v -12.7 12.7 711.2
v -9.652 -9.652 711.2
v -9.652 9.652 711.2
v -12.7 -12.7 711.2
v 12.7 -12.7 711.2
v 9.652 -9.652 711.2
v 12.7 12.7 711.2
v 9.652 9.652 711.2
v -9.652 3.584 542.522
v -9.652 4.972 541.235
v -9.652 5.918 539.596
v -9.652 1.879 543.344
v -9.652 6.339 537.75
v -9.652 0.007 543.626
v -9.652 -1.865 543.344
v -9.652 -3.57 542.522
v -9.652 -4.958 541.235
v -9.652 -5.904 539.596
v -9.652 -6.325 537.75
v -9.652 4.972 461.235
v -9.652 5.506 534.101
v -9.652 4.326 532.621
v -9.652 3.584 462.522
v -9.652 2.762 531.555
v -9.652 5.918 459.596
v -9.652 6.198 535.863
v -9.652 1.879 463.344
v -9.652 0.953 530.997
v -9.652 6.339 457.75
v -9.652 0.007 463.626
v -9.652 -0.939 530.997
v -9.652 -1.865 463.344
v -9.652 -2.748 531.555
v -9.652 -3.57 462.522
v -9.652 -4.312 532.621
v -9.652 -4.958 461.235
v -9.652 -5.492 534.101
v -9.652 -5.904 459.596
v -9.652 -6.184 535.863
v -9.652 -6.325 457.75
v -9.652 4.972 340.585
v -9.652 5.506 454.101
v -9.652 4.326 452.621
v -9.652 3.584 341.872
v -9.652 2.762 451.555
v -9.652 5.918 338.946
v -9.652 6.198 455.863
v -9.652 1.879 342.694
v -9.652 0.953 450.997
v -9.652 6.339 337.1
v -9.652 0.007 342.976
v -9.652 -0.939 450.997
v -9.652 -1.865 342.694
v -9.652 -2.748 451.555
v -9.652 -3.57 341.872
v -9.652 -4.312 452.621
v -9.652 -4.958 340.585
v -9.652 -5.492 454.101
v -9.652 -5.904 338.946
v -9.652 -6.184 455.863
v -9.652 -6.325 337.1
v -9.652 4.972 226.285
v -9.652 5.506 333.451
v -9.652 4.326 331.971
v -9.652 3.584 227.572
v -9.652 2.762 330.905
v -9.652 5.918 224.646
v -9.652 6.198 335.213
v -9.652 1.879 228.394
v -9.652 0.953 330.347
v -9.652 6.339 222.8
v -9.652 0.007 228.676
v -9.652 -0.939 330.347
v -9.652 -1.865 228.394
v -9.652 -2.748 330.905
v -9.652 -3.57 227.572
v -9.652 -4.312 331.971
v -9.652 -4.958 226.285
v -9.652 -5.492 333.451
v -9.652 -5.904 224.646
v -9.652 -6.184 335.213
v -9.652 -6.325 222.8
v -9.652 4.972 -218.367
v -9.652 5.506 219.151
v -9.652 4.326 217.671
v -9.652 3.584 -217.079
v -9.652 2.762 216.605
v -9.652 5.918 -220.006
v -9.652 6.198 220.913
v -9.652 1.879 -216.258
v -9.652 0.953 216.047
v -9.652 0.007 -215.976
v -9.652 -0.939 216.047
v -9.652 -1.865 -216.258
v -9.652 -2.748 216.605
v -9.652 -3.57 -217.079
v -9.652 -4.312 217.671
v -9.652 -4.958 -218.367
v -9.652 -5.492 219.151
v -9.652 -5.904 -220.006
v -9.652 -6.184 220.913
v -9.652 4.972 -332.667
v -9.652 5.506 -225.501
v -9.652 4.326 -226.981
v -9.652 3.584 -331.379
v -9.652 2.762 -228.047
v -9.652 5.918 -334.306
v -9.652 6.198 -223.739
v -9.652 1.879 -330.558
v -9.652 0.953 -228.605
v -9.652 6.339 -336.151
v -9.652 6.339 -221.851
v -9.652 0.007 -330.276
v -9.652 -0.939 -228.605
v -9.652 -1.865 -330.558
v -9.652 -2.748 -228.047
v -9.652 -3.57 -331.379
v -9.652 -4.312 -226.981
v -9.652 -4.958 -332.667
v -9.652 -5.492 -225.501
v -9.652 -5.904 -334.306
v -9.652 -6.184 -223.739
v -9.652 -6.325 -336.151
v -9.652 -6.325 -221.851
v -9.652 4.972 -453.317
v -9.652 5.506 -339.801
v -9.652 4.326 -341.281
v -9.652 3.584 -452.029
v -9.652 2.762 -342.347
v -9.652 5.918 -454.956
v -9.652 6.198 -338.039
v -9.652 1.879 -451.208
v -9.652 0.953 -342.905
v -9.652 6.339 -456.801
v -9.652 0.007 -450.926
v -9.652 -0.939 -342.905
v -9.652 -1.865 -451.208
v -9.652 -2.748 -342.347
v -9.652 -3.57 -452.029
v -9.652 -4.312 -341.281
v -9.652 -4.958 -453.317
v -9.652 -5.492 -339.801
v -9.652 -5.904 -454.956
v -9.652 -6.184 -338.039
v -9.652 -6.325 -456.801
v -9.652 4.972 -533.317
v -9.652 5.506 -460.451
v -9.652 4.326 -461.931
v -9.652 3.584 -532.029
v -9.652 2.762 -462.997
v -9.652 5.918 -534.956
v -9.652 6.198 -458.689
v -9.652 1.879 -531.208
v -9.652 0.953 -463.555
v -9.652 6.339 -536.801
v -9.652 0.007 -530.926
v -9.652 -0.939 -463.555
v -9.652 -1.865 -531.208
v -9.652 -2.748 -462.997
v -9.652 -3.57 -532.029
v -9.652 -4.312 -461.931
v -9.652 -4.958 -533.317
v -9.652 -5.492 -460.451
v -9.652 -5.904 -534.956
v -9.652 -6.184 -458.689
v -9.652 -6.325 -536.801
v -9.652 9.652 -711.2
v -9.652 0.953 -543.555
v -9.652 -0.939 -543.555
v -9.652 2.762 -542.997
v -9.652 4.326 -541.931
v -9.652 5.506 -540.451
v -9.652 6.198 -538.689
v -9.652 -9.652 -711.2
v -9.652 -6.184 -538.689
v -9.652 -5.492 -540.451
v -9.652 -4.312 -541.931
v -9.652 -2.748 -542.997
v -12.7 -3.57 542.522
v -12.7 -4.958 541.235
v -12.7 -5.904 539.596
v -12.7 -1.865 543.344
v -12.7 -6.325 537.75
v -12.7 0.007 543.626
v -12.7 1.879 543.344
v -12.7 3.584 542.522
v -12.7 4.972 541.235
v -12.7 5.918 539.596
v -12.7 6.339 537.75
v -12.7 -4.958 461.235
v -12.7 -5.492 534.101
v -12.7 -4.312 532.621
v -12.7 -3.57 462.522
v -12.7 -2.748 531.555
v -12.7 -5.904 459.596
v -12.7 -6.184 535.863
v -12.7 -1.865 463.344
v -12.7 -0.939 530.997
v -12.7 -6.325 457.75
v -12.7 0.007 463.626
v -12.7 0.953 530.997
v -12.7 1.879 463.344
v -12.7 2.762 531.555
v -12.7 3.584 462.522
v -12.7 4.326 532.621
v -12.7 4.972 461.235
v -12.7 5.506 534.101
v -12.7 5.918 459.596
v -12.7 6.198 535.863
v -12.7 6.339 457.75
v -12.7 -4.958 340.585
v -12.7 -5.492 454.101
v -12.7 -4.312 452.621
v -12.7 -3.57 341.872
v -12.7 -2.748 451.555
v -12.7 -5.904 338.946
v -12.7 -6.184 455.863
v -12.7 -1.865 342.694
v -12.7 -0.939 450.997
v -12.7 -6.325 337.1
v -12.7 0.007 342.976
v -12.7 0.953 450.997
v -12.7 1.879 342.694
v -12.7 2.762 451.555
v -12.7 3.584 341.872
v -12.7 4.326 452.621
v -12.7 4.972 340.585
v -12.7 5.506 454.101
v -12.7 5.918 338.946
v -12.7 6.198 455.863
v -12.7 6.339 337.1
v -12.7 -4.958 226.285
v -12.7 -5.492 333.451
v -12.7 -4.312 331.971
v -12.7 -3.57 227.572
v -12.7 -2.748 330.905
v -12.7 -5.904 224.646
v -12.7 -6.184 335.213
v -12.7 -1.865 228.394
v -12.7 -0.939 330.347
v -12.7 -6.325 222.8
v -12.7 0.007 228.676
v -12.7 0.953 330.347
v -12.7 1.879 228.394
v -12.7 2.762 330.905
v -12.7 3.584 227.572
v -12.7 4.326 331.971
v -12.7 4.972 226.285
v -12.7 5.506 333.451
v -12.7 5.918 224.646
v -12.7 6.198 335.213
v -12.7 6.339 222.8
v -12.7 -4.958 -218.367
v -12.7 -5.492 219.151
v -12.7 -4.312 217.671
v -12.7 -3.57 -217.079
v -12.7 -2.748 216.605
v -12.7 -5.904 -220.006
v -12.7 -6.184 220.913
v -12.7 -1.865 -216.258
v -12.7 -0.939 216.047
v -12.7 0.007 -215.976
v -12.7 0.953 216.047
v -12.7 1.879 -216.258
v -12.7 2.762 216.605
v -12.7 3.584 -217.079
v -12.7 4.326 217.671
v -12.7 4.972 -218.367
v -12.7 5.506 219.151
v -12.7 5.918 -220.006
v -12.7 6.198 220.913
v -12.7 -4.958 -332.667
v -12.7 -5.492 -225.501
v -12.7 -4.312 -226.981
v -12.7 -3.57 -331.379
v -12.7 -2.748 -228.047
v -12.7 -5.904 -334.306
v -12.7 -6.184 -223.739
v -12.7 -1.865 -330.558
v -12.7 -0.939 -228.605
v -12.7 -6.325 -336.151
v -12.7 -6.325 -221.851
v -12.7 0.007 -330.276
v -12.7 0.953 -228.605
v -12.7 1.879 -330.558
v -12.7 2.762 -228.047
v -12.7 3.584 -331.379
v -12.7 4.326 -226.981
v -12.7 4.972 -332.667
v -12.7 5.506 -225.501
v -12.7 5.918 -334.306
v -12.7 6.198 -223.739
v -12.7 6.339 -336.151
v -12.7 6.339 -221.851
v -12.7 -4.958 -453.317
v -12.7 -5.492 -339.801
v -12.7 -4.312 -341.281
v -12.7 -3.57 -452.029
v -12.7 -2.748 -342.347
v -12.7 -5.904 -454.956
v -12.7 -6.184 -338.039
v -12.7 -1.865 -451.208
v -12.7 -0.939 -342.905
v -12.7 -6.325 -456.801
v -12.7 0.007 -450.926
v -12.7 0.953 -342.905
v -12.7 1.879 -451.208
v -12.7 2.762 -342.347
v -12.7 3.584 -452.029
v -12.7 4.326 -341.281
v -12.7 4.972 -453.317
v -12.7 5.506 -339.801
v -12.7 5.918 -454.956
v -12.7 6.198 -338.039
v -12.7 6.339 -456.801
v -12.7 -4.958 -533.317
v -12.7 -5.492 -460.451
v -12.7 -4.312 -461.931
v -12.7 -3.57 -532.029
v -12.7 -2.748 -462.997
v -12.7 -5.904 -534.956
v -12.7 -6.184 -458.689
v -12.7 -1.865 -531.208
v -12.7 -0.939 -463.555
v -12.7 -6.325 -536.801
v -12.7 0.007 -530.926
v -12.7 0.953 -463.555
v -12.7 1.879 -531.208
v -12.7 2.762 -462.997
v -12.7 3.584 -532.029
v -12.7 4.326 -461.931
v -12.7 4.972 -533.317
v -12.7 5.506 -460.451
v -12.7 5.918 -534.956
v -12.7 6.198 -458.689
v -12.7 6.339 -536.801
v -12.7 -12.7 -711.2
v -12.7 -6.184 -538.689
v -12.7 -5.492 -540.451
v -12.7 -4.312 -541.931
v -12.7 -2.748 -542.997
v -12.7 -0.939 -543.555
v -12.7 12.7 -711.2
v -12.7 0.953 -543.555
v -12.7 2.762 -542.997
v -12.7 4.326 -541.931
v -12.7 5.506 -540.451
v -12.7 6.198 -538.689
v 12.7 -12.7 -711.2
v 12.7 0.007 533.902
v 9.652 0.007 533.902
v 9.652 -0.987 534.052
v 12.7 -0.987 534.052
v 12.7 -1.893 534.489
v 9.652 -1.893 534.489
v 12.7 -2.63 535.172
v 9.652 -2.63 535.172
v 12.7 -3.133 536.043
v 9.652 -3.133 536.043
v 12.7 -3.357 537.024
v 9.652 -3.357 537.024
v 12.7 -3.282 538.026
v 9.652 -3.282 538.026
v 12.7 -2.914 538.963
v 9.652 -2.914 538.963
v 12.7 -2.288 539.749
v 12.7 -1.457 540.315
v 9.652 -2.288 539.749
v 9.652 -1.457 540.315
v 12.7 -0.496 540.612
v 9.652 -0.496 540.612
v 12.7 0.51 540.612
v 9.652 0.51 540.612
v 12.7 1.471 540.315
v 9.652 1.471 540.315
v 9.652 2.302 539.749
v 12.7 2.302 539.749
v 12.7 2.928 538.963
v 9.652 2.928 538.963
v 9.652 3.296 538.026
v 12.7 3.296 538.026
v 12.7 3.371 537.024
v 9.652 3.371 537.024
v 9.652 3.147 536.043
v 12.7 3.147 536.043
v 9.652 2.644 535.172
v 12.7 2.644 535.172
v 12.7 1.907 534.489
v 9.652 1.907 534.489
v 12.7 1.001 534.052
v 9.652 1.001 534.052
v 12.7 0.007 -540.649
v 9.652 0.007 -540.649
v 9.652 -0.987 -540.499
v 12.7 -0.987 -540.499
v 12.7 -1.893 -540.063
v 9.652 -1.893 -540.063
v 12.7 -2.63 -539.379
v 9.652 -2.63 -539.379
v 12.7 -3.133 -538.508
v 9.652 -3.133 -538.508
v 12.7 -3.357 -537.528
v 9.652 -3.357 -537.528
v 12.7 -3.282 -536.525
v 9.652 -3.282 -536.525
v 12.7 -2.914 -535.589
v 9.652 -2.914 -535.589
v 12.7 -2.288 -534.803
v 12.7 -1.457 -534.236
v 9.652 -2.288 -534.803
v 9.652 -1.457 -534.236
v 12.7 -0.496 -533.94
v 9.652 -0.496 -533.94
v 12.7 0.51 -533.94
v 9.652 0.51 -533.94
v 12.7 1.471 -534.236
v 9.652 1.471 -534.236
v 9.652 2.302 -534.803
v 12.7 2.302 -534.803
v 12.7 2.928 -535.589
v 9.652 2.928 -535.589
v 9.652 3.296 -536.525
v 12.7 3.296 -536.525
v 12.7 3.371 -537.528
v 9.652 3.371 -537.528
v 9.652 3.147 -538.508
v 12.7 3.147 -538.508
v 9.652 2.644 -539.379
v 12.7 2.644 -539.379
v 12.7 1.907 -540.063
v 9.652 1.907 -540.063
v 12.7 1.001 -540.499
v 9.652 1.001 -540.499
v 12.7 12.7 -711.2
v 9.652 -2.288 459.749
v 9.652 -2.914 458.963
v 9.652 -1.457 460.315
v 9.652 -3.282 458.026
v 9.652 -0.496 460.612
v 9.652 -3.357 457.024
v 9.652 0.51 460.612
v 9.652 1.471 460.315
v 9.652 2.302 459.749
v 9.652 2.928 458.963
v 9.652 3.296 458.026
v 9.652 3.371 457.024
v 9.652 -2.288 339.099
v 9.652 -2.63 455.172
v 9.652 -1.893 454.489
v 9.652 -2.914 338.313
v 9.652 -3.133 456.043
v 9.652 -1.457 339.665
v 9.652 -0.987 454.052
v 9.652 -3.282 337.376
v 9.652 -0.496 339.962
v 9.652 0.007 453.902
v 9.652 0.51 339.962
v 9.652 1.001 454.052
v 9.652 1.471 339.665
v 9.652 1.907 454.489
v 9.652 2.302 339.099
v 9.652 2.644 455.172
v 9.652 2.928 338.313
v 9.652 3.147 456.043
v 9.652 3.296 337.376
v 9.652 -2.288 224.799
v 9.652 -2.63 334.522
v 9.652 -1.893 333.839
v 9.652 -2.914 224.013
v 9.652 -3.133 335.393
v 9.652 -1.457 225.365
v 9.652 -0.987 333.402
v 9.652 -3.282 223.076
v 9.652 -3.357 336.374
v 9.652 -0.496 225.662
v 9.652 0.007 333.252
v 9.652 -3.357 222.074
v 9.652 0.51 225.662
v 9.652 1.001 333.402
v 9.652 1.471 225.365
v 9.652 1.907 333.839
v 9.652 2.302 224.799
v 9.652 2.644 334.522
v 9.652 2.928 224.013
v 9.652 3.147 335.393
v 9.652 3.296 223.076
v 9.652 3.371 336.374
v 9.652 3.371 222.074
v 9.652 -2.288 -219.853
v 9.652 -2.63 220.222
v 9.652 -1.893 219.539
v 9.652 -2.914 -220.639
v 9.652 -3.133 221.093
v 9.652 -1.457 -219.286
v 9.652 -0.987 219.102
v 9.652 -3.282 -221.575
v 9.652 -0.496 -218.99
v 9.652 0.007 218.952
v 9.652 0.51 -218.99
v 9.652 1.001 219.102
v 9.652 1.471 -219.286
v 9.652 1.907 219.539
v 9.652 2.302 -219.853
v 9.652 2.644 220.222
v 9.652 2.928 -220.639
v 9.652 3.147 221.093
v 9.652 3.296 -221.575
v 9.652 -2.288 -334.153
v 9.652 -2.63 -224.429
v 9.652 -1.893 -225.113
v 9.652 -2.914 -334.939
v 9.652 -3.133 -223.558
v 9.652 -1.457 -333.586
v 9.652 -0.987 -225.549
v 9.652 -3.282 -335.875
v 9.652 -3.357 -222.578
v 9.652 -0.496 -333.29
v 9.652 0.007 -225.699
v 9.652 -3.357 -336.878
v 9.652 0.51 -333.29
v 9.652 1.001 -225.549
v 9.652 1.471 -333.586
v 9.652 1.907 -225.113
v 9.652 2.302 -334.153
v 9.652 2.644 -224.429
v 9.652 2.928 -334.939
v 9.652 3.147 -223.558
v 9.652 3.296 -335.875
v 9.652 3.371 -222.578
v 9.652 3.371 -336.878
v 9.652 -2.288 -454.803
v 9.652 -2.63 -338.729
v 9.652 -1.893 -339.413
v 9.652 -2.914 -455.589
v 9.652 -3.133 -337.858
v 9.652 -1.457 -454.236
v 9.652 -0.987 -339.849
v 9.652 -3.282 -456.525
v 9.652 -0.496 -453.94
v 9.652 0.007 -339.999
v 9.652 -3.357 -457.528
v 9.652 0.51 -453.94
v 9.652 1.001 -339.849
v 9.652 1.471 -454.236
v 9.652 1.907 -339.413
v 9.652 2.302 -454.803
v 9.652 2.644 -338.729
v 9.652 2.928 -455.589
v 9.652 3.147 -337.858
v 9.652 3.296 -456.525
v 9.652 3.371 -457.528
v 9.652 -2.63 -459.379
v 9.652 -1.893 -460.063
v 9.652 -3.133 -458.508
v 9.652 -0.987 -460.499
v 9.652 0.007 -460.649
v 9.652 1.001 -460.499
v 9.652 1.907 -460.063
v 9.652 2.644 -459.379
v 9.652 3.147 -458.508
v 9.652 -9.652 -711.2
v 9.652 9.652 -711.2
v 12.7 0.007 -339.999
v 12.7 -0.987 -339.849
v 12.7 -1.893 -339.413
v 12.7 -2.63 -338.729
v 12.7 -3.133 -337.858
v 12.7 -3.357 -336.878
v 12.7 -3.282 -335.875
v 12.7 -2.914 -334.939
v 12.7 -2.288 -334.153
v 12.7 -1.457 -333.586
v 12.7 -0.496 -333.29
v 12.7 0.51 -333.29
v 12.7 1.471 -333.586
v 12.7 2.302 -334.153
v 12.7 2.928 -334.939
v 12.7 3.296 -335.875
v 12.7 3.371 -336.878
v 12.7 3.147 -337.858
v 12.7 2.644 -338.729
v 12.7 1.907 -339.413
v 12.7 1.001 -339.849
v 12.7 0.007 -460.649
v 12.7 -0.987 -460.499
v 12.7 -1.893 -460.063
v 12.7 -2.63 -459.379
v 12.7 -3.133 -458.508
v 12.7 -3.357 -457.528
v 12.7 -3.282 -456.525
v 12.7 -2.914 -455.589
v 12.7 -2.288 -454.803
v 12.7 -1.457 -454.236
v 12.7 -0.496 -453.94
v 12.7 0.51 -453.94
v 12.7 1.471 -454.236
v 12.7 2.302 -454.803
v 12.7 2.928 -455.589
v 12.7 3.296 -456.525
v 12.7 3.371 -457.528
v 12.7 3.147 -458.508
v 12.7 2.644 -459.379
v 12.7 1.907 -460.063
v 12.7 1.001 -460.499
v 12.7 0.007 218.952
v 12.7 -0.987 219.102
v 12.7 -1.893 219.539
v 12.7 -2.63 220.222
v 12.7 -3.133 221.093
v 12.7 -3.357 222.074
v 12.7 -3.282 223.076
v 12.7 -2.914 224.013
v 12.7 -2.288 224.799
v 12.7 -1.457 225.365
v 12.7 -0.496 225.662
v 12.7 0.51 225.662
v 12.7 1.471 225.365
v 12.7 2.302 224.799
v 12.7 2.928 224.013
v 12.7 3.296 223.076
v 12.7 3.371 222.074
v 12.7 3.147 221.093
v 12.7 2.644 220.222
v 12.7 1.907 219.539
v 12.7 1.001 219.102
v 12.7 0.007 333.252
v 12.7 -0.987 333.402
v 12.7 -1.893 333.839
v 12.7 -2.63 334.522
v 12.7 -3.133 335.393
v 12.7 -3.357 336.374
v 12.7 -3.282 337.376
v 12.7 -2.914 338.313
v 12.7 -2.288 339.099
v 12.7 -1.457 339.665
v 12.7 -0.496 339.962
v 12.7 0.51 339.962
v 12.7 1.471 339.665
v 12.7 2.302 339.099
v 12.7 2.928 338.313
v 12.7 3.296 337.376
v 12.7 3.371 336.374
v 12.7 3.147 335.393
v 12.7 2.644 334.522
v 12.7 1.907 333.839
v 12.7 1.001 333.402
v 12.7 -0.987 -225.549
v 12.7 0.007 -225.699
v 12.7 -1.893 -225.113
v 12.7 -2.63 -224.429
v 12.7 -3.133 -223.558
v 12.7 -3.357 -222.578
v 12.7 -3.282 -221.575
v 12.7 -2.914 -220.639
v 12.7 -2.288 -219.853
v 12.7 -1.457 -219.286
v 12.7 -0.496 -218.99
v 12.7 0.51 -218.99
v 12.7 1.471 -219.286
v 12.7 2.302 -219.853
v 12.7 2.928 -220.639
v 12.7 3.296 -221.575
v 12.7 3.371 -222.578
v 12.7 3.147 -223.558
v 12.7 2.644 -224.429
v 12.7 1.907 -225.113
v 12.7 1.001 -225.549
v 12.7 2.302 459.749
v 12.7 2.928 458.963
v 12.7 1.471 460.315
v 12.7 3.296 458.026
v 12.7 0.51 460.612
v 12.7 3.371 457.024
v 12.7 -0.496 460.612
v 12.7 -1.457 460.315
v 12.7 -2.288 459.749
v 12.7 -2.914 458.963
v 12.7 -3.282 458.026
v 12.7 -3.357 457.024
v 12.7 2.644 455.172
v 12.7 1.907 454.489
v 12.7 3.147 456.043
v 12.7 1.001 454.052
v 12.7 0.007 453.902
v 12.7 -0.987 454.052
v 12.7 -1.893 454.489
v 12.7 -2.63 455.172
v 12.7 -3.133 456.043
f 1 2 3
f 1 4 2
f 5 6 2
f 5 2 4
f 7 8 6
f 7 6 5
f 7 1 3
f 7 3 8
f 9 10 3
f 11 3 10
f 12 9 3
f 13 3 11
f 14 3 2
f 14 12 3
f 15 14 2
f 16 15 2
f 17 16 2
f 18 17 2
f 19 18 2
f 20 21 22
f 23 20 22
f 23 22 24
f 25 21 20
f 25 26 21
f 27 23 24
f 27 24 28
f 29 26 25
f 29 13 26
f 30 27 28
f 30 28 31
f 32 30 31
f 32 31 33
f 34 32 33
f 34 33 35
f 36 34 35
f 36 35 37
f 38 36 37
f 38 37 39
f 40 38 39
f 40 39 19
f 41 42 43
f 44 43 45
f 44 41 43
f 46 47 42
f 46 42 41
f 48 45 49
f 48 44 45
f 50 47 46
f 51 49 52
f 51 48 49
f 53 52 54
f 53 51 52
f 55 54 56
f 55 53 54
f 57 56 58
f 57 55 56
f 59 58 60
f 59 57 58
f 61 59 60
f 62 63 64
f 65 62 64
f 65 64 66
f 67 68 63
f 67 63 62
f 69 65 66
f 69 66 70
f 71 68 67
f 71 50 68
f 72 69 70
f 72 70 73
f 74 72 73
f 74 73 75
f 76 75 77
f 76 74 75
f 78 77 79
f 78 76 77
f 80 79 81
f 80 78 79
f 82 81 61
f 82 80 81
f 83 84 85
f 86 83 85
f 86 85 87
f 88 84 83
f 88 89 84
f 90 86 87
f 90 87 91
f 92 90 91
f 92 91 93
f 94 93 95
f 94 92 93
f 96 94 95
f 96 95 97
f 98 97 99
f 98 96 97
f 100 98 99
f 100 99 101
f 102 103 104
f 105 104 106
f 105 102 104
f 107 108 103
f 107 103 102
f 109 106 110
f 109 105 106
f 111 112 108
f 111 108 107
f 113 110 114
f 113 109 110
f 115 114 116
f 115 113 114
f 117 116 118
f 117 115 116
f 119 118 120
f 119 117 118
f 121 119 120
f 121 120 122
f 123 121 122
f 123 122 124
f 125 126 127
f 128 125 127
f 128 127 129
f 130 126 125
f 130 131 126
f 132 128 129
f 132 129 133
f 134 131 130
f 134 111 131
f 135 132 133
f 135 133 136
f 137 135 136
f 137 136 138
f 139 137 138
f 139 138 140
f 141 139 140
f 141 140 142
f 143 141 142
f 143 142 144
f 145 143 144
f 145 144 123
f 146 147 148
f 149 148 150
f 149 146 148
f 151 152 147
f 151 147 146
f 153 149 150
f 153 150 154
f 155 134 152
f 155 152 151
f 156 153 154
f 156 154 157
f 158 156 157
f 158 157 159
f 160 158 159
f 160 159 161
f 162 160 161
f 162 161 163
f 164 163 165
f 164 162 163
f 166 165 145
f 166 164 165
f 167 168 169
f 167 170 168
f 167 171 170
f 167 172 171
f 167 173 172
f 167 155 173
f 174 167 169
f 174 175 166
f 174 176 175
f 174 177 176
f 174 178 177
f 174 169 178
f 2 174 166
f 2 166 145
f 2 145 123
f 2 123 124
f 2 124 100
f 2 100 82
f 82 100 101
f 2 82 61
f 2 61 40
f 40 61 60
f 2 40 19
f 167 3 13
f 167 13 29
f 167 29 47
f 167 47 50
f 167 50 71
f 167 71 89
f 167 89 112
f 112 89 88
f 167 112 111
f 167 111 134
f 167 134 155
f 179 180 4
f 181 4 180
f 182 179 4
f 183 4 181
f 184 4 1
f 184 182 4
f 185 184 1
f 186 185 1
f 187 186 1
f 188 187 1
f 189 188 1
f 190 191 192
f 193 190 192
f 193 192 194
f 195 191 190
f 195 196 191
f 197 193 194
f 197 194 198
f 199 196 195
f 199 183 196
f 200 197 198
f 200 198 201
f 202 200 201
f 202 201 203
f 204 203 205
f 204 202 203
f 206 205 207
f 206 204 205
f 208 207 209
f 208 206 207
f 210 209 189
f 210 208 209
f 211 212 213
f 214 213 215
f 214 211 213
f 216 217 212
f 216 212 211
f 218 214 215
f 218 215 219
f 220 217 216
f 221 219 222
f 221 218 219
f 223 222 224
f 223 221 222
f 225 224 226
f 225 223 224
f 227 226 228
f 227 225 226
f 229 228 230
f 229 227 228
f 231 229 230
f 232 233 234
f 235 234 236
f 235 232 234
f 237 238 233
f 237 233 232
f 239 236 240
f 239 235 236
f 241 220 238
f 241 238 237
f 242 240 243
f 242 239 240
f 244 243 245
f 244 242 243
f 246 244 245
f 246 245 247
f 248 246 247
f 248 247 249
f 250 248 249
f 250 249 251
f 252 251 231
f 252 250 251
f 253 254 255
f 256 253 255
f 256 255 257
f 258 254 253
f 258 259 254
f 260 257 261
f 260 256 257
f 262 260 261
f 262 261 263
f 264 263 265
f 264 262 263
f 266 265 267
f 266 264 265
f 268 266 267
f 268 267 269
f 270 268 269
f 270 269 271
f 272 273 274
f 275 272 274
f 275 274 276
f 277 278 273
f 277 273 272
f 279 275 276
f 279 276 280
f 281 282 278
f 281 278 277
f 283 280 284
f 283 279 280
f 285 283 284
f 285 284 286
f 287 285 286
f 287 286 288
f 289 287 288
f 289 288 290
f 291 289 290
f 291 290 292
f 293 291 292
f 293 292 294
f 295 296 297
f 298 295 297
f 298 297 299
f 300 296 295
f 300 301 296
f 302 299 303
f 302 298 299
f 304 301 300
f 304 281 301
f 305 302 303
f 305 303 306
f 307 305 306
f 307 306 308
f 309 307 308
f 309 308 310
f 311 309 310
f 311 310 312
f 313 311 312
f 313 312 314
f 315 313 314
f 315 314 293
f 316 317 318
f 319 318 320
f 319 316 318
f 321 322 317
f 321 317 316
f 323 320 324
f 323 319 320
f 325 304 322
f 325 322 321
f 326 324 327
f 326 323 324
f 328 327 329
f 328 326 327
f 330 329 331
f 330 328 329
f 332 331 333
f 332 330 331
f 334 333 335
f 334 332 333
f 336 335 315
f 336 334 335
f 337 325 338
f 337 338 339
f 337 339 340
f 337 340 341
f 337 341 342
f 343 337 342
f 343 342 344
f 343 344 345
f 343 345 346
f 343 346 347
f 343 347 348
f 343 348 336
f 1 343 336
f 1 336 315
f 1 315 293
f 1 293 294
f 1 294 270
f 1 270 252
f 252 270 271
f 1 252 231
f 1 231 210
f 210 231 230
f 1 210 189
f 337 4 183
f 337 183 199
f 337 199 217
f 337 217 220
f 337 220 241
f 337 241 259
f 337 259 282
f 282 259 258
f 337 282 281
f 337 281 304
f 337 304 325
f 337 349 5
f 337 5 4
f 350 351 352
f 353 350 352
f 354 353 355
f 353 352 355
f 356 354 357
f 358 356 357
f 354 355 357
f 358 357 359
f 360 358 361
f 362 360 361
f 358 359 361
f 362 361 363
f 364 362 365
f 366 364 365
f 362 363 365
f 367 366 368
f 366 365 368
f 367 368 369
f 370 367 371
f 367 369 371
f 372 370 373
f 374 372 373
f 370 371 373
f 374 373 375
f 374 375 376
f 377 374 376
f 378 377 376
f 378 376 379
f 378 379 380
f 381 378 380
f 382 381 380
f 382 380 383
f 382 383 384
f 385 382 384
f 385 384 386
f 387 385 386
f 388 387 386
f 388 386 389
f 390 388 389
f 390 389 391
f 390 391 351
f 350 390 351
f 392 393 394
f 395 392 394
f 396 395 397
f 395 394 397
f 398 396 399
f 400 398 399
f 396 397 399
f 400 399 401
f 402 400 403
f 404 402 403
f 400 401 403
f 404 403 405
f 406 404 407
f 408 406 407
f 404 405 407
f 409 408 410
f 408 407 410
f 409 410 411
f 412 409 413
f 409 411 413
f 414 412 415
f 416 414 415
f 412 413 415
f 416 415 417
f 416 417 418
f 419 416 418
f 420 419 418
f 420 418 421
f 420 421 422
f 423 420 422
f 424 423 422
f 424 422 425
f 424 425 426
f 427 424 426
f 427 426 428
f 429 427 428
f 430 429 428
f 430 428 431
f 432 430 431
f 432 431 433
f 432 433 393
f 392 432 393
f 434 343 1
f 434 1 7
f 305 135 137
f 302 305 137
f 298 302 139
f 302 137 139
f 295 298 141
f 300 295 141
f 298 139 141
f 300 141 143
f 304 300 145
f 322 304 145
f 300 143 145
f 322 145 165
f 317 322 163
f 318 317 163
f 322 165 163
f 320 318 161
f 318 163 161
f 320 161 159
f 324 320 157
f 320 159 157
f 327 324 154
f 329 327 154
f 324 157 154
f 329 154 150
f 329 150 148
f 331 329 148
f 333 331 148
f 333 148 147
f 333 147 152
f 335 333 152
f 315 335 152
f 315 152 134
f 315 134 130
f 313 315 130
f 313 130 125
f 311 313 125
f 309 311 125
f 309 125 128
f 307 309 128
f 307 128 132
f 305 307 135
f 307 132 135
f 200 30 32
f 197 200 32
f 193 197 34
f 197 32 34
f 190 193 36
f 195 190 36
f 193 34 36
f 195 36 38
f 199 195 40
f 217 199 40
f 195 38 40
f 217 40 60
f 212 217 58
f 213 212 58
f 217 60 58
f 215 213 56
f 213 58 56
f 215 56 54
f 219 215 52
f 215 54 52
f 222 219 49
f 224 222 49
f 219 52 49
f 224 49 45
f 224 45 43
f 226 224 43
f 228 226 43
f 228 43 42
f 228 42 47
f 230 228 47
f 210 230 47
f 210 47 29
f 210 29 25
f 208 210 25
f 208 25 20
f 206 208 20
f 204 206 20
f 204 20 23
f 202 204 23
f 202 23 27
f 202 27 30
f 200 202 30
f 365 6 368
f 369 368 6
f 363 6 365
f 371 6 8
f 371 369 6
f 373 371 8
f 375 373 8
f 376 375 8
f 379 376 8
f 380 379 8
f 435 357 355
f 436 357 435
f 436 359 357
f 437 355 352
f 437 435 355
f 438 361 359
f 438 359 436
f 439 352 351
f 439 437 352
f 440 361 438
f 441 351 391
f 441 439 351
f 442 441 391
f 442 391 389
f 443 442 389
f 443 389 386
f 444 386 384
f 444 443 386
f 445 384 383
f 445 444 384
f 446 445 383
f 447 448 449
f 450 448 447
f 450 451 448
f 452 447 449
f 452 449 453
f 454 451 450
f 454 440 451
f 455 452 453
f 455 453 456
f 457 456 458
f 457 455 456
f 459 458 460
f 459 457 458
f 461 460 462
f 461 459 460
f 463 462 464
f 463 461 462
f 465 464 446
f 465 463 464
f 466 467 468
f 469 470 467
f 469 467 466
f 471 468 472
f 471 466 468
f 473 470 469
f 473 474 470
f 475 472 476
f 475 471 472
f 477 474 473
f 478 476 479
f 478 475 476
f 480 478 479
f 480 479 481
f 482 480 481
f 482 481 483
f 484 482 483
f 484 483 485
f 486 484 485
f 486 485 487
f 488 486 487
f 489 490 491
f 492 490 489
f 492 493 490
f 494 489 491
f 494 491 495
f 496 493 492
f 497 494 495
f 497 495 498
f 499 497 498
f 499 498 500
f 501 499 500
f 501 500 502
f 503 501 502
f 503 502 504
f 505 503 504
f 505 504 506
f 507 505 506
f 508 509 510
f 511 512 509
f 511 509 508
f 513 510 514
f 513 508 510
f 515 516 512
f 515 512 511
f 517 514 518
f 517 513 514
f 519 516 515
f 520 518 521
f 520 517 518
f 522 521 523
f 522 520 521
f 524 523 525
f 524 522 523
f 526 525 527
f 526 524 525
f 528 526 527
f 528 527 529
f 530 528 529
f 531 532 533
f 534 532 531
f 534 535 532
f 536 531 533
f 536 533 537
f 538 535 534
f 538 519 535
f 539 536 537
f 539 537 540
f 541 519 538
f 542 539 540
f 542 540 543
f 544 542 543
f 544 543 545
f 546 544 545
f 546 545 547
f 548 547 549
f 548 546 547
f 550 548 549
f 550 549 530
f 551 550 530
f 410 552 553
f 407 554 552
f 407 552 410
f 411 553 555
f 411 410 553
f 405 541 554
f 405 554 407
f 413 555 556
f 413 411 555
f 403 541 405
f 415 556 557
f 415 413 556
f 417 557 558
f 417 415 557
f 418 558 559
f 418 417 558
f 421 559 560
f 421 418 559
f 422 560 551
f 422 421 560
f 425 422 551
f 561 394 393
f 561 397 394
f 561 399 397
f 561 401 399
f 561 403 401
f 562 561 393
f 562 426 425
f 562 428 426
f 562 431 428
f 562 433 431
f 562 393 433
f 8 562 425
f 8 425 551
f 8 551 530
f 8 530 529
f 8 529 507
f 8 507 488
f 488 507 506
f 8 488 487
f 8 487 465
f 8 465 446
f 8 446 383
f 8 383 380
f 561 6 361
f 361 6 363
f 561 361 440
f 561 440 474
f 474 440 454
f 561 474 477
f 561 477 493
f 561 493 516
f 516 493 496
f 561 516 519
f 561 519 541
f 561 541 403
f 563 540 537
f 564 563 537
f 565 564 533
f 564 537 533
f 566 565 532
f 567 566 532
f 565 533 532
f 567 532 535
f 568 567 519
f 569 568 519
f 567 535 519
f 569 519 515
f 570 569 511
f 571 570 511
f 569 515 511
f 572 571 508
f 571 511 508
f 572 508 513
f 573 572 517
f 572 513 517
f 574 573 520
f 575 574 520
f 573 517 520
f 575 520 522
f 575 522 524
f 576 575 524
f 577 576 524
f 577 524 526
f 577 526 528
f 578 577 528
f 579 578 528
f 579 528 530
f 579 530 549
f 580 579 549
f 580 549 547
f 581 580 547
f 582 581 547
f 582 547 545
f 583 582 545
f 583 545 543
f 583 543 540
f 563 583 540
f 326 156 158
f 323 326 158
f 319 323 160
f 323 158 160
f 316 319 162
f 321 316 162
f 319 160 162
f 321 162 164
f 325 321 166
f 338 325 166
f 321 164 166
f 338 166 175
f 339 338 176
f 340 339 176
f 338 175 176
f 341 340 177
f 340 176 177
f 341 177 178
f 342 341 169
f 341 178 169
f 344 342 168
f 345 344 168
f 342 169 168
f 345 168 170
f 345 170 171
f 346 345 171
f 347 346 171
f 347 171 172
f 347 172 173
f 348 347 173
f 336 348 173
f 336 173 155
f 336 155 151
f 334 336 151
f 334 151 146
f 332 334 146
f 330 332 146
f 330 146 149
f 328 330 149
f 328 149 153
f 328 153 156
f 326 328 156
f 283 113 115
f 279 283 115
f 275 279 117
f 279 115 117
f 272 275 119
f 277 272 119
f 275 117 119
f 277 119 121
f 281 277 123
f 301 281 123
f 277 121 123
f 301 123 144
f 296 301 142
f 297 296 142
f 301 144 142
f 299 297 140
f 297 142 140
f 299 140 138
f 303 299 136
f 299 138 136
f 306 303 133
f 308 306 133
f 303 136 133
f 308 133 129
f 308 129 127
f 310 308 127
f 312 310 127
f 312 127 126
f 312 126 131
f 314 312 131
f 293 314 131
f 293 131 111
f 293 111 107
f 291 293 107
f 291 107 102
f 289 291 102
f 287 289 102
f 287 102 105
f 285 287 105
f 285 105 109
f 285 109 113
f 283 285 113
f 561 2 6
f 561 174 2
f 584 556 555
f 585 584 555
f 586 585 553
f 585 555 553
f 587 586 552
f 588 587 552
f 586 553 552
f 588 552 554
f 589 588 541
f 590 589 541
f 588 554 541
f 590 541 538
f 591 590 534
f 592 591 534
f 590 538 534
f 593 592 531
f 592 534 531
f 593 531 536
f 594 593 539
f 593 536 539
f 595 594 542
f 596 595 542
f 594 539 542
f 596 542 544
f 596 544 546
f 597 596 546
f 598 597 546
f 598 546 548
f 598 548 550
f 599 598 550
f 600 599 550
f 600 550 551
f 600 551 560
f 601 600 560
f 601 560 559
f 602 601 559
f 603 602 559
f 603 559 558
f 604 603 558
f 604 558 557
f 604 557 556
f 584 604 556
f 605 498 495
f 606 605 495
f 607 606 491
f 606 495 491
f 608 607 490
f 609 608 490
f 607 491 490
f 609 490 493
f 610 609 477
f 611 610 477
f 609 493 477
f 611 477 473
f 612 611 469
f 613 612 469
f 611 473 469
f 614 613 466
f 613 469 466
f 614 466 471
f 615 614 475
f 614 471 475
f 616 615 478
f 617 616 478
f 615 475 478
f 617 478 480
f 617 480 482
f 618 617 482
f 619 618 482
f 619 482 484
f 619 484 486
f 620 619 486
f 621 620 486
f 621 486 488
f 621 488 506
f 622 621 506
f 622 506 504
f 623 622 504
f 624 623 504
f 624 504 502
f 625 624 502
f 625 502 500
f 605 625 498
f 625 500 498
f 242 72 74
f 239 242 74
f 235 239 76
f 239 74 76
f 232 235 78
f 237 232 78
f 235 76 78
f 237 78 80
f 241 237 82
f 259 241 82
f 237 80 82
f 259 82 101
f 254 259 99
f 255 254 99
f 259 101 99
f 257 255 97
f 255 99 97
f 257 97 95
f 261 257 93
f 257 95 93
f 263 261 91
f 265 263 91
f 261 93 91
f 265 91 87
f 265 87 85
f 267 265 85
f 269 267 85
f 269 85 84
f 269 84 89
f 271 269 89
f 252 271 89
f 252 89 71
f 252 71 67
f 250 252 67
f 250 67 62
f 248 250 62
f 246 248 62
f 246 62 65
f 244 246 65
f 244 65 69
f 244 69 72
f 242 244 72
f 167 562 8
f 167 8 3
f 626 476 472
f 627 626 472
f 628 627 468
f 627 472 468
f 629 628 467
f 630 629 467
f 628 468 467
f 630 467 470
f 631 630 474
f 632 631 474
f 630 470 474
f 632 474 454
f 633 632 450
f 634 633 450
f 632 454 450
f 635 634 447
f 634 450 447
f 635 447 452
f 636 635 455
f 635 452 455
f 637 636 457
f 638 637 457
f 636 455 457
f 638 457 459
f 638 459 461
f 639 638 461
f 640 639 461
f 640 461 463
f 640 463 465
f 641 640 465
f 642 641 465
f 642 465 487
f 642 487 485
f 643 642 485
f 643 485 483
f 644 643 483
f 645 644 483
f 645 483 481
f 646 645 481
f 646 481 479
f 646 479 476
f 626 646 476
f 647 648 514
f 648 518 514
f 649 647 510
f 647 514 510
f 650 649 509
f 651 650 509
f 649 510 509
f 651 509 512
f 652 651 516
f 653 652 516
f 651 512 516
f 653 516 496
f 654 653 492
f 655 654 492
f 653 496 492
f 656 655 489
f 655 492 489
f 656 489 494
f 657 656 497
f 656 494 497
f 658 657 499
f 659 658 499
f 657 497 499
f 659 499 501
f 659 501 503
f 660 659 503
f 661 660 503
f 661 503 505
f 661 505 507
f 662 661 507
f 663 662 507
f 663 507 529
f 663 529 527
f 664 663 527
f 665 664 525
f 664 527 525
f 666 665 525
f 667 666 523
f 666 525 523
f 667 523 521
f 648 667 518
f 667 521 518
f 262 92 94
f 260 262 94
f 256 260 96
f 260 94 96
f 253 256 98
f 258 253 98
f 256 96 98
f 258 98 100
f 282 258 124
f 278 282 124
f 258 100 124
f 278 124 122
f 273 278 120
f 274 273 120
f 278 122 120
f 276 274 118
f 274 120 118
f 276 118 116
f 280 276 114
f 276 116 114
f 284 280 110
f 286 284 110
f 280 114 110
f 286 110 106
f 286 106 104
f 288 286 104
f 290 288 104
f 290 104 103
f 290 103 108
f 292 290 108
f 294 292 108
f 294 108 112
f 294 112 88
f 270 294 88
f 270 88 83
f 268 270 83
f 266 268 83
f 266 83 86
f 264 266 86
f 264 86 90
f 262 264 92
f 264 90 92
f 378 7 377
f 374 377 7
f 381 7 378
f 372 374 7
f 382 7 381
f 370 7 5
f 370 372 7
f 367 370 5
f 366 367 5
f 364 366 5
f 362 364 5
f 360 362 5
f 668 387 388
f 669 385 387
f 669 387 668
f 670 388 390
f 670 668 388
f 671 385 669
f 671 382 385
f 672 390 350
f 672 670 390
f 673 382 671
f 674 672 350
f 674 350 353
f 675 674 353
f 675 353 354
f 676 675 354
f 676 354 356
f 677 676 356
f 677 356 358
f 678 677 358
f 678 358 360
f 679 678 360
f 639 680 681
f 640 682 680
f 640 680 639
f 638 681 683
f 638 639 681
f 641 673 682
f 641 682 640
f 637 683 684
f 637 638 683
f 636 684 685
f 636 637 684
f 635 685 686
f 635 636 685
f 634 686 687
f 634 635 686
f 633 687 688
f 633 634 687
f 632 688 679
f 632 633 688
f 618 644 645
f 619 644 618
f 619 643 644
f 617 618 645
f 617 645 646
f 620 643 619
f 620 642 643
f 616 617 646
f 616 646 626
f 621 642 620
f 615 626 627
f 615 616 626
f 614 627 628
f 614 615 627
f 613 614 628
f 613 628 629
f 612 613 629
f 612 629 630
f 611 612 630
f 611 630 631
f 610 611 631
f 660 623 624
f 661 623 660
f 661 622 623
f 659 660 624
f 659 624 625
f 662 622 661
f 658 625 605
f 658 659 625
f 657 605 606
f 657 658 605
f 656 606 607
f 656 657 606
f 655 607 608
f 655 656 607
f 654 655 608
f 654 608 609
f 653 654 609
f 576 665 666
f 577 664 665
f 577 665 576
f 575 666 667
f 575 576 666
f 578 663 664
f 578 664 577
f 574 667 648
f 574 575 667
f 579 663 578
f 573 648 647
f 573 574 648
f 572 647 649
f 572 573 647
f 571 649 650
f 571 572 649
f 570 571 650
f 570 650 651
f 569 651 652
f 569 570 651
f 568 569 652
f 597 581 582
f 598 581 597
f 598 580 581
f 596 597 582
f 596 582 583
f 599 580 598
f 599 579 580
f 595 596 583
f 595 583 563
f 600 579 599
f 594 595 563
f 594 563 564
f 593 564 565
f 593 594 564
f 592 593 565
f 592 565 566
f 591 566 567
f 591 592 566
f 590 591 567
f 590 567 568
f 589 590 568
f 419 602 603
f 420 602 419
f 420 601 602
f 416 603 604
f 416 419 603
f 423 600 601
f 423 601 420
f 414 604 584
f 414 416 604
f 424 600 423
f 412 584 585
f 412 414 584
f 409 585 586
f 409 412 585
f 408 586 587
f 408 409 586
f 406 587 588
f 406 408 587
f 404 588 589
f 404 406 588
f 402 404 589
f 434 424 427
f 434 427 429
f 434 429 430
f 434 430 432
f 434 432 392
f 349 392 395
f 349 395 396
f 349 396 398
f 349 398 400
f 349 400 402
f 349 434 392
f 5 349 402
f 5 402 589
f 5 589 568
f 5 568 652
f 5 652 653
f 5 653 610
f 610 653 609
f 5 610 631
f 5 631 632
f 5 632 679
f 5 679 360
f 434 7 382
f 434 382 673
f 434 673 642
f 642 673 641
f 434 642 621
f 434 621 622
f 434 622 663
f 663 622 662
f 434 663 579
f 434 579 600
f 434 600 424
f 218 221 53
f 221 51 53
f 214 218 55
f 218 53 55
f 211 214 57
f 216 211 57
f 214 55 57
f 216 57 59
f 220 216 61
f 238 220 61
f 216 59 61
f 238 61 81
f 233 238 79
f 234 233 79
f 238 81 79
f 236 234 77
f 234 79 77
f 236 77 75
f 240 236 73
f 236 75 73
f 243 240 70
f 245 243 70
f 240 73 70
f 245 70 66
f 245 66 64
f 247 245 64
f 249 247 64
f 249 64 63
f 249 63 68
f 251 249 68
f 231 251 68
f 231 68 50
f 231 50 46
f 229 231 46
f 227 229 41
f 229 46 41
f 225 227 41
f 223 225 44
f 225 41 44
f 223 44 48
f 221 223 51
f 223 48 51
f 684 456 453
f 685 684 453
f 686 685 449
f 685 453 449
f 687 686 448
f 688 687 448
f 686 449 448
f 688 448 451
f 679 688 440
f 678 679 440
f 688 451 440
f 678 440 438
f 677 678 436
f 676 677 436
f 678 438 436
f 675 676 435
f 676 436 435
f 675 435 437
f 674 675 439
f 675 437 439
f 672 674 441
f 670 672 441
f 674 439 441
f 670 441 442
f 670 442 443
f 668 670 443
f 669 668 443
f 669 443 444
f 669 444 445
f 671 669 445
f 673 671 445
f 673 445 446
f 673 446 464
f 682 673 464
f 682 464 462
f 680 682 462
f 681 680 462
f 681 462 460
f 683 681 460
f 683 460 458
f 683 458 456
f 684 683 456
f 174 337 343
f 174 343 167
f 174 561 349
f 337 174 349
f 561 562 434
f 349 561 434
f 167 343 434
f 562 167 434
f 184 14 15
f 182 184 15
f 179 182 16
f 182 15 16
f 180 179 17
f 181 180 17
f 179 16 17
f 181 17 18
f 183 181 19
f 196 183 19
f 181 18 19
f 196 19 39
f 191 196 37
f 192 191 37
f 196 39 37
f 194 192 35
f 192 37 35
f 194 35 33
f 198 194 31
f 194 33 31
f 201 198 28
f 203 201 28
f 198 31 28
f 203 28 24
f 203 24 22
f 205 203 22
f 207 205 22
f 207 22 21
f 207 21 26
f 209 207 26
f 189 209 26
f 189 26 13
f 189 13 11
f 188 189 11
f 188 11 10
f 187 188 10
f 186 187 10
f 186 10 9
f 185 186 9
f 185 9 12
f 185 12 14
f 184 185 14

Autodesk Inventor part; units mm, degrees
ref_plane "YZ Plane" through (0, 0, 0) normal (1, 0, 0) x (0, 1, 0)
ref_plane "XZ Plane" through (0, 0, 0) normal (0, 1, 0) x (-1, 0, 0)
ref_plane "XY Plane" through (0, 0, 0) normal (0, 0, 1) x (1, 0, 0)
sketch "Sketch1" plane through (0, 0, 0) normal (0, 0, 1) x (1, 0, 0)
  line L0 (-12.7, 12.7) -> (12.7, 12.7)
  line L1 (12.7, 12.7) -> (12.7, -12.7)
  line L2 (12.7, -12.7) -> (-12.7, -12.7)
  line L3 (-12.7, -12.7) -> (-12.7, 12.7)
  line L4 (9.652, 9.652) -> (-9.652, 9.652)
  line L5 (-9.652, 9.652) -> (-9.652, -9.652)
  line L6 (-9.652, -9.652) -> (9.652, -9.652)
  line L7 (9.652, -9.652) -> (9.652, 9.652)
  point P0 (0, 0)
  point P1 (12.7, 0)
  point P2 (0, 12.7)
  dimension "d0" = 25.4
  dimension "d1" = 25.4
  dimension "d2" = 3.048
extrude "Extrusion1" add sketch "Sketch1" along normal mid plane 1422.4
sketch "Sketch2" plane through (0, 0, 0) normal (0, 0, 1) x (1, 0, 0)
  point P0 (0, 0)
sketch "Sketch3" plane through (12.7, 12.7, 711.2) normal (1, 0, 0) x (0, 0, -1)
  circle A0 centre (1248.4758, -12.693) radius 4.25 projected
  circle A1 centre (1168.4758, -12.693) radius 4.4 projected
  circle A2 centre (253.9242, -12.693) radius 4.4 projected
  circle A3 centre (173.9242, -12.693) radius 4.25 projected
  point P0 (711.2, -12.7)
  point P1 (488.8742, -12.693)
  point P2 (374.5742, -12.693)
  point P3 (933.5258, -12.693)
  point P4 (1047.8258, -12.693)
  dimension "d5" = 114.3
  dimension "d6" = 120.65
  dimension "d7" = 120.65
  dimension "d8" = 114.3
hole "Hole1" at (12.7, 0.007, -537.2758) at (12.7, 0.007, -457.2758) at (12.7, 0.007, -336.6258) at (12.7, 0.007, -222.3258) at (12.7, 0.007, 222.3258) at (12.7, 0.007, 336.6258) at (12.7, 0.007, 457.2758) at (12.7, 0.007, 537.2758) direction (-1, 0, 0) diameter 6.7469 depth 3.175 tip angle 118
sketch "Sketch4" plane through (-12.7, -12.7, -711.2) normal (-1, 0, 0) x (0, 0, 1)
  circle A0 centre (173.9242, 12.707) radius 3.3734 projected
  circle A1 centre (253.9242, 12.707) radius 3.3734 projected
  circle A2 centre (374.5742, 12.707) radius 3.3734 projected
  circle A3 centre (488.8742, 12.707) radius 3.3734 projected
  circle A4 centre (933.5258, 12.707) radius 3.3734 projected
  circle A5 centre (1047.8258, 12.707) radius 3.3734 projected
  circle A6 centre (1168.4758, 12.707) radius 3.3734 projected
  circle A7 centre (1248.4758, 12.707) radius 3.3734 projected
  point P0 (711.2, 12.7)
hole "Hole2" at (-12.7, 0.007, 537.2758) at (-12.7, 0.007, 457.2758) at (-12.7, 0.007, 336.6258) at (-12.7, 0.007, 222.3258) at (-12.7, 0.007, -222.3258) at (-12.7, 0.007, -336.6258) at (-12.7, 0.007, -457.2758) at (-12.7, 0.007, -537.2758) direction (1, 0, 0) diameter 12.7 depth 3.175 tip angle 118
equation "\"d2\" = thick"
equation "\"d3\" = L2"
equation "\"L\" = 1219.2"
equation "\"thick\" = 3.048"
equation "\"L2\" = 1422.4"
properties part number "1inSquareSupportOut"
